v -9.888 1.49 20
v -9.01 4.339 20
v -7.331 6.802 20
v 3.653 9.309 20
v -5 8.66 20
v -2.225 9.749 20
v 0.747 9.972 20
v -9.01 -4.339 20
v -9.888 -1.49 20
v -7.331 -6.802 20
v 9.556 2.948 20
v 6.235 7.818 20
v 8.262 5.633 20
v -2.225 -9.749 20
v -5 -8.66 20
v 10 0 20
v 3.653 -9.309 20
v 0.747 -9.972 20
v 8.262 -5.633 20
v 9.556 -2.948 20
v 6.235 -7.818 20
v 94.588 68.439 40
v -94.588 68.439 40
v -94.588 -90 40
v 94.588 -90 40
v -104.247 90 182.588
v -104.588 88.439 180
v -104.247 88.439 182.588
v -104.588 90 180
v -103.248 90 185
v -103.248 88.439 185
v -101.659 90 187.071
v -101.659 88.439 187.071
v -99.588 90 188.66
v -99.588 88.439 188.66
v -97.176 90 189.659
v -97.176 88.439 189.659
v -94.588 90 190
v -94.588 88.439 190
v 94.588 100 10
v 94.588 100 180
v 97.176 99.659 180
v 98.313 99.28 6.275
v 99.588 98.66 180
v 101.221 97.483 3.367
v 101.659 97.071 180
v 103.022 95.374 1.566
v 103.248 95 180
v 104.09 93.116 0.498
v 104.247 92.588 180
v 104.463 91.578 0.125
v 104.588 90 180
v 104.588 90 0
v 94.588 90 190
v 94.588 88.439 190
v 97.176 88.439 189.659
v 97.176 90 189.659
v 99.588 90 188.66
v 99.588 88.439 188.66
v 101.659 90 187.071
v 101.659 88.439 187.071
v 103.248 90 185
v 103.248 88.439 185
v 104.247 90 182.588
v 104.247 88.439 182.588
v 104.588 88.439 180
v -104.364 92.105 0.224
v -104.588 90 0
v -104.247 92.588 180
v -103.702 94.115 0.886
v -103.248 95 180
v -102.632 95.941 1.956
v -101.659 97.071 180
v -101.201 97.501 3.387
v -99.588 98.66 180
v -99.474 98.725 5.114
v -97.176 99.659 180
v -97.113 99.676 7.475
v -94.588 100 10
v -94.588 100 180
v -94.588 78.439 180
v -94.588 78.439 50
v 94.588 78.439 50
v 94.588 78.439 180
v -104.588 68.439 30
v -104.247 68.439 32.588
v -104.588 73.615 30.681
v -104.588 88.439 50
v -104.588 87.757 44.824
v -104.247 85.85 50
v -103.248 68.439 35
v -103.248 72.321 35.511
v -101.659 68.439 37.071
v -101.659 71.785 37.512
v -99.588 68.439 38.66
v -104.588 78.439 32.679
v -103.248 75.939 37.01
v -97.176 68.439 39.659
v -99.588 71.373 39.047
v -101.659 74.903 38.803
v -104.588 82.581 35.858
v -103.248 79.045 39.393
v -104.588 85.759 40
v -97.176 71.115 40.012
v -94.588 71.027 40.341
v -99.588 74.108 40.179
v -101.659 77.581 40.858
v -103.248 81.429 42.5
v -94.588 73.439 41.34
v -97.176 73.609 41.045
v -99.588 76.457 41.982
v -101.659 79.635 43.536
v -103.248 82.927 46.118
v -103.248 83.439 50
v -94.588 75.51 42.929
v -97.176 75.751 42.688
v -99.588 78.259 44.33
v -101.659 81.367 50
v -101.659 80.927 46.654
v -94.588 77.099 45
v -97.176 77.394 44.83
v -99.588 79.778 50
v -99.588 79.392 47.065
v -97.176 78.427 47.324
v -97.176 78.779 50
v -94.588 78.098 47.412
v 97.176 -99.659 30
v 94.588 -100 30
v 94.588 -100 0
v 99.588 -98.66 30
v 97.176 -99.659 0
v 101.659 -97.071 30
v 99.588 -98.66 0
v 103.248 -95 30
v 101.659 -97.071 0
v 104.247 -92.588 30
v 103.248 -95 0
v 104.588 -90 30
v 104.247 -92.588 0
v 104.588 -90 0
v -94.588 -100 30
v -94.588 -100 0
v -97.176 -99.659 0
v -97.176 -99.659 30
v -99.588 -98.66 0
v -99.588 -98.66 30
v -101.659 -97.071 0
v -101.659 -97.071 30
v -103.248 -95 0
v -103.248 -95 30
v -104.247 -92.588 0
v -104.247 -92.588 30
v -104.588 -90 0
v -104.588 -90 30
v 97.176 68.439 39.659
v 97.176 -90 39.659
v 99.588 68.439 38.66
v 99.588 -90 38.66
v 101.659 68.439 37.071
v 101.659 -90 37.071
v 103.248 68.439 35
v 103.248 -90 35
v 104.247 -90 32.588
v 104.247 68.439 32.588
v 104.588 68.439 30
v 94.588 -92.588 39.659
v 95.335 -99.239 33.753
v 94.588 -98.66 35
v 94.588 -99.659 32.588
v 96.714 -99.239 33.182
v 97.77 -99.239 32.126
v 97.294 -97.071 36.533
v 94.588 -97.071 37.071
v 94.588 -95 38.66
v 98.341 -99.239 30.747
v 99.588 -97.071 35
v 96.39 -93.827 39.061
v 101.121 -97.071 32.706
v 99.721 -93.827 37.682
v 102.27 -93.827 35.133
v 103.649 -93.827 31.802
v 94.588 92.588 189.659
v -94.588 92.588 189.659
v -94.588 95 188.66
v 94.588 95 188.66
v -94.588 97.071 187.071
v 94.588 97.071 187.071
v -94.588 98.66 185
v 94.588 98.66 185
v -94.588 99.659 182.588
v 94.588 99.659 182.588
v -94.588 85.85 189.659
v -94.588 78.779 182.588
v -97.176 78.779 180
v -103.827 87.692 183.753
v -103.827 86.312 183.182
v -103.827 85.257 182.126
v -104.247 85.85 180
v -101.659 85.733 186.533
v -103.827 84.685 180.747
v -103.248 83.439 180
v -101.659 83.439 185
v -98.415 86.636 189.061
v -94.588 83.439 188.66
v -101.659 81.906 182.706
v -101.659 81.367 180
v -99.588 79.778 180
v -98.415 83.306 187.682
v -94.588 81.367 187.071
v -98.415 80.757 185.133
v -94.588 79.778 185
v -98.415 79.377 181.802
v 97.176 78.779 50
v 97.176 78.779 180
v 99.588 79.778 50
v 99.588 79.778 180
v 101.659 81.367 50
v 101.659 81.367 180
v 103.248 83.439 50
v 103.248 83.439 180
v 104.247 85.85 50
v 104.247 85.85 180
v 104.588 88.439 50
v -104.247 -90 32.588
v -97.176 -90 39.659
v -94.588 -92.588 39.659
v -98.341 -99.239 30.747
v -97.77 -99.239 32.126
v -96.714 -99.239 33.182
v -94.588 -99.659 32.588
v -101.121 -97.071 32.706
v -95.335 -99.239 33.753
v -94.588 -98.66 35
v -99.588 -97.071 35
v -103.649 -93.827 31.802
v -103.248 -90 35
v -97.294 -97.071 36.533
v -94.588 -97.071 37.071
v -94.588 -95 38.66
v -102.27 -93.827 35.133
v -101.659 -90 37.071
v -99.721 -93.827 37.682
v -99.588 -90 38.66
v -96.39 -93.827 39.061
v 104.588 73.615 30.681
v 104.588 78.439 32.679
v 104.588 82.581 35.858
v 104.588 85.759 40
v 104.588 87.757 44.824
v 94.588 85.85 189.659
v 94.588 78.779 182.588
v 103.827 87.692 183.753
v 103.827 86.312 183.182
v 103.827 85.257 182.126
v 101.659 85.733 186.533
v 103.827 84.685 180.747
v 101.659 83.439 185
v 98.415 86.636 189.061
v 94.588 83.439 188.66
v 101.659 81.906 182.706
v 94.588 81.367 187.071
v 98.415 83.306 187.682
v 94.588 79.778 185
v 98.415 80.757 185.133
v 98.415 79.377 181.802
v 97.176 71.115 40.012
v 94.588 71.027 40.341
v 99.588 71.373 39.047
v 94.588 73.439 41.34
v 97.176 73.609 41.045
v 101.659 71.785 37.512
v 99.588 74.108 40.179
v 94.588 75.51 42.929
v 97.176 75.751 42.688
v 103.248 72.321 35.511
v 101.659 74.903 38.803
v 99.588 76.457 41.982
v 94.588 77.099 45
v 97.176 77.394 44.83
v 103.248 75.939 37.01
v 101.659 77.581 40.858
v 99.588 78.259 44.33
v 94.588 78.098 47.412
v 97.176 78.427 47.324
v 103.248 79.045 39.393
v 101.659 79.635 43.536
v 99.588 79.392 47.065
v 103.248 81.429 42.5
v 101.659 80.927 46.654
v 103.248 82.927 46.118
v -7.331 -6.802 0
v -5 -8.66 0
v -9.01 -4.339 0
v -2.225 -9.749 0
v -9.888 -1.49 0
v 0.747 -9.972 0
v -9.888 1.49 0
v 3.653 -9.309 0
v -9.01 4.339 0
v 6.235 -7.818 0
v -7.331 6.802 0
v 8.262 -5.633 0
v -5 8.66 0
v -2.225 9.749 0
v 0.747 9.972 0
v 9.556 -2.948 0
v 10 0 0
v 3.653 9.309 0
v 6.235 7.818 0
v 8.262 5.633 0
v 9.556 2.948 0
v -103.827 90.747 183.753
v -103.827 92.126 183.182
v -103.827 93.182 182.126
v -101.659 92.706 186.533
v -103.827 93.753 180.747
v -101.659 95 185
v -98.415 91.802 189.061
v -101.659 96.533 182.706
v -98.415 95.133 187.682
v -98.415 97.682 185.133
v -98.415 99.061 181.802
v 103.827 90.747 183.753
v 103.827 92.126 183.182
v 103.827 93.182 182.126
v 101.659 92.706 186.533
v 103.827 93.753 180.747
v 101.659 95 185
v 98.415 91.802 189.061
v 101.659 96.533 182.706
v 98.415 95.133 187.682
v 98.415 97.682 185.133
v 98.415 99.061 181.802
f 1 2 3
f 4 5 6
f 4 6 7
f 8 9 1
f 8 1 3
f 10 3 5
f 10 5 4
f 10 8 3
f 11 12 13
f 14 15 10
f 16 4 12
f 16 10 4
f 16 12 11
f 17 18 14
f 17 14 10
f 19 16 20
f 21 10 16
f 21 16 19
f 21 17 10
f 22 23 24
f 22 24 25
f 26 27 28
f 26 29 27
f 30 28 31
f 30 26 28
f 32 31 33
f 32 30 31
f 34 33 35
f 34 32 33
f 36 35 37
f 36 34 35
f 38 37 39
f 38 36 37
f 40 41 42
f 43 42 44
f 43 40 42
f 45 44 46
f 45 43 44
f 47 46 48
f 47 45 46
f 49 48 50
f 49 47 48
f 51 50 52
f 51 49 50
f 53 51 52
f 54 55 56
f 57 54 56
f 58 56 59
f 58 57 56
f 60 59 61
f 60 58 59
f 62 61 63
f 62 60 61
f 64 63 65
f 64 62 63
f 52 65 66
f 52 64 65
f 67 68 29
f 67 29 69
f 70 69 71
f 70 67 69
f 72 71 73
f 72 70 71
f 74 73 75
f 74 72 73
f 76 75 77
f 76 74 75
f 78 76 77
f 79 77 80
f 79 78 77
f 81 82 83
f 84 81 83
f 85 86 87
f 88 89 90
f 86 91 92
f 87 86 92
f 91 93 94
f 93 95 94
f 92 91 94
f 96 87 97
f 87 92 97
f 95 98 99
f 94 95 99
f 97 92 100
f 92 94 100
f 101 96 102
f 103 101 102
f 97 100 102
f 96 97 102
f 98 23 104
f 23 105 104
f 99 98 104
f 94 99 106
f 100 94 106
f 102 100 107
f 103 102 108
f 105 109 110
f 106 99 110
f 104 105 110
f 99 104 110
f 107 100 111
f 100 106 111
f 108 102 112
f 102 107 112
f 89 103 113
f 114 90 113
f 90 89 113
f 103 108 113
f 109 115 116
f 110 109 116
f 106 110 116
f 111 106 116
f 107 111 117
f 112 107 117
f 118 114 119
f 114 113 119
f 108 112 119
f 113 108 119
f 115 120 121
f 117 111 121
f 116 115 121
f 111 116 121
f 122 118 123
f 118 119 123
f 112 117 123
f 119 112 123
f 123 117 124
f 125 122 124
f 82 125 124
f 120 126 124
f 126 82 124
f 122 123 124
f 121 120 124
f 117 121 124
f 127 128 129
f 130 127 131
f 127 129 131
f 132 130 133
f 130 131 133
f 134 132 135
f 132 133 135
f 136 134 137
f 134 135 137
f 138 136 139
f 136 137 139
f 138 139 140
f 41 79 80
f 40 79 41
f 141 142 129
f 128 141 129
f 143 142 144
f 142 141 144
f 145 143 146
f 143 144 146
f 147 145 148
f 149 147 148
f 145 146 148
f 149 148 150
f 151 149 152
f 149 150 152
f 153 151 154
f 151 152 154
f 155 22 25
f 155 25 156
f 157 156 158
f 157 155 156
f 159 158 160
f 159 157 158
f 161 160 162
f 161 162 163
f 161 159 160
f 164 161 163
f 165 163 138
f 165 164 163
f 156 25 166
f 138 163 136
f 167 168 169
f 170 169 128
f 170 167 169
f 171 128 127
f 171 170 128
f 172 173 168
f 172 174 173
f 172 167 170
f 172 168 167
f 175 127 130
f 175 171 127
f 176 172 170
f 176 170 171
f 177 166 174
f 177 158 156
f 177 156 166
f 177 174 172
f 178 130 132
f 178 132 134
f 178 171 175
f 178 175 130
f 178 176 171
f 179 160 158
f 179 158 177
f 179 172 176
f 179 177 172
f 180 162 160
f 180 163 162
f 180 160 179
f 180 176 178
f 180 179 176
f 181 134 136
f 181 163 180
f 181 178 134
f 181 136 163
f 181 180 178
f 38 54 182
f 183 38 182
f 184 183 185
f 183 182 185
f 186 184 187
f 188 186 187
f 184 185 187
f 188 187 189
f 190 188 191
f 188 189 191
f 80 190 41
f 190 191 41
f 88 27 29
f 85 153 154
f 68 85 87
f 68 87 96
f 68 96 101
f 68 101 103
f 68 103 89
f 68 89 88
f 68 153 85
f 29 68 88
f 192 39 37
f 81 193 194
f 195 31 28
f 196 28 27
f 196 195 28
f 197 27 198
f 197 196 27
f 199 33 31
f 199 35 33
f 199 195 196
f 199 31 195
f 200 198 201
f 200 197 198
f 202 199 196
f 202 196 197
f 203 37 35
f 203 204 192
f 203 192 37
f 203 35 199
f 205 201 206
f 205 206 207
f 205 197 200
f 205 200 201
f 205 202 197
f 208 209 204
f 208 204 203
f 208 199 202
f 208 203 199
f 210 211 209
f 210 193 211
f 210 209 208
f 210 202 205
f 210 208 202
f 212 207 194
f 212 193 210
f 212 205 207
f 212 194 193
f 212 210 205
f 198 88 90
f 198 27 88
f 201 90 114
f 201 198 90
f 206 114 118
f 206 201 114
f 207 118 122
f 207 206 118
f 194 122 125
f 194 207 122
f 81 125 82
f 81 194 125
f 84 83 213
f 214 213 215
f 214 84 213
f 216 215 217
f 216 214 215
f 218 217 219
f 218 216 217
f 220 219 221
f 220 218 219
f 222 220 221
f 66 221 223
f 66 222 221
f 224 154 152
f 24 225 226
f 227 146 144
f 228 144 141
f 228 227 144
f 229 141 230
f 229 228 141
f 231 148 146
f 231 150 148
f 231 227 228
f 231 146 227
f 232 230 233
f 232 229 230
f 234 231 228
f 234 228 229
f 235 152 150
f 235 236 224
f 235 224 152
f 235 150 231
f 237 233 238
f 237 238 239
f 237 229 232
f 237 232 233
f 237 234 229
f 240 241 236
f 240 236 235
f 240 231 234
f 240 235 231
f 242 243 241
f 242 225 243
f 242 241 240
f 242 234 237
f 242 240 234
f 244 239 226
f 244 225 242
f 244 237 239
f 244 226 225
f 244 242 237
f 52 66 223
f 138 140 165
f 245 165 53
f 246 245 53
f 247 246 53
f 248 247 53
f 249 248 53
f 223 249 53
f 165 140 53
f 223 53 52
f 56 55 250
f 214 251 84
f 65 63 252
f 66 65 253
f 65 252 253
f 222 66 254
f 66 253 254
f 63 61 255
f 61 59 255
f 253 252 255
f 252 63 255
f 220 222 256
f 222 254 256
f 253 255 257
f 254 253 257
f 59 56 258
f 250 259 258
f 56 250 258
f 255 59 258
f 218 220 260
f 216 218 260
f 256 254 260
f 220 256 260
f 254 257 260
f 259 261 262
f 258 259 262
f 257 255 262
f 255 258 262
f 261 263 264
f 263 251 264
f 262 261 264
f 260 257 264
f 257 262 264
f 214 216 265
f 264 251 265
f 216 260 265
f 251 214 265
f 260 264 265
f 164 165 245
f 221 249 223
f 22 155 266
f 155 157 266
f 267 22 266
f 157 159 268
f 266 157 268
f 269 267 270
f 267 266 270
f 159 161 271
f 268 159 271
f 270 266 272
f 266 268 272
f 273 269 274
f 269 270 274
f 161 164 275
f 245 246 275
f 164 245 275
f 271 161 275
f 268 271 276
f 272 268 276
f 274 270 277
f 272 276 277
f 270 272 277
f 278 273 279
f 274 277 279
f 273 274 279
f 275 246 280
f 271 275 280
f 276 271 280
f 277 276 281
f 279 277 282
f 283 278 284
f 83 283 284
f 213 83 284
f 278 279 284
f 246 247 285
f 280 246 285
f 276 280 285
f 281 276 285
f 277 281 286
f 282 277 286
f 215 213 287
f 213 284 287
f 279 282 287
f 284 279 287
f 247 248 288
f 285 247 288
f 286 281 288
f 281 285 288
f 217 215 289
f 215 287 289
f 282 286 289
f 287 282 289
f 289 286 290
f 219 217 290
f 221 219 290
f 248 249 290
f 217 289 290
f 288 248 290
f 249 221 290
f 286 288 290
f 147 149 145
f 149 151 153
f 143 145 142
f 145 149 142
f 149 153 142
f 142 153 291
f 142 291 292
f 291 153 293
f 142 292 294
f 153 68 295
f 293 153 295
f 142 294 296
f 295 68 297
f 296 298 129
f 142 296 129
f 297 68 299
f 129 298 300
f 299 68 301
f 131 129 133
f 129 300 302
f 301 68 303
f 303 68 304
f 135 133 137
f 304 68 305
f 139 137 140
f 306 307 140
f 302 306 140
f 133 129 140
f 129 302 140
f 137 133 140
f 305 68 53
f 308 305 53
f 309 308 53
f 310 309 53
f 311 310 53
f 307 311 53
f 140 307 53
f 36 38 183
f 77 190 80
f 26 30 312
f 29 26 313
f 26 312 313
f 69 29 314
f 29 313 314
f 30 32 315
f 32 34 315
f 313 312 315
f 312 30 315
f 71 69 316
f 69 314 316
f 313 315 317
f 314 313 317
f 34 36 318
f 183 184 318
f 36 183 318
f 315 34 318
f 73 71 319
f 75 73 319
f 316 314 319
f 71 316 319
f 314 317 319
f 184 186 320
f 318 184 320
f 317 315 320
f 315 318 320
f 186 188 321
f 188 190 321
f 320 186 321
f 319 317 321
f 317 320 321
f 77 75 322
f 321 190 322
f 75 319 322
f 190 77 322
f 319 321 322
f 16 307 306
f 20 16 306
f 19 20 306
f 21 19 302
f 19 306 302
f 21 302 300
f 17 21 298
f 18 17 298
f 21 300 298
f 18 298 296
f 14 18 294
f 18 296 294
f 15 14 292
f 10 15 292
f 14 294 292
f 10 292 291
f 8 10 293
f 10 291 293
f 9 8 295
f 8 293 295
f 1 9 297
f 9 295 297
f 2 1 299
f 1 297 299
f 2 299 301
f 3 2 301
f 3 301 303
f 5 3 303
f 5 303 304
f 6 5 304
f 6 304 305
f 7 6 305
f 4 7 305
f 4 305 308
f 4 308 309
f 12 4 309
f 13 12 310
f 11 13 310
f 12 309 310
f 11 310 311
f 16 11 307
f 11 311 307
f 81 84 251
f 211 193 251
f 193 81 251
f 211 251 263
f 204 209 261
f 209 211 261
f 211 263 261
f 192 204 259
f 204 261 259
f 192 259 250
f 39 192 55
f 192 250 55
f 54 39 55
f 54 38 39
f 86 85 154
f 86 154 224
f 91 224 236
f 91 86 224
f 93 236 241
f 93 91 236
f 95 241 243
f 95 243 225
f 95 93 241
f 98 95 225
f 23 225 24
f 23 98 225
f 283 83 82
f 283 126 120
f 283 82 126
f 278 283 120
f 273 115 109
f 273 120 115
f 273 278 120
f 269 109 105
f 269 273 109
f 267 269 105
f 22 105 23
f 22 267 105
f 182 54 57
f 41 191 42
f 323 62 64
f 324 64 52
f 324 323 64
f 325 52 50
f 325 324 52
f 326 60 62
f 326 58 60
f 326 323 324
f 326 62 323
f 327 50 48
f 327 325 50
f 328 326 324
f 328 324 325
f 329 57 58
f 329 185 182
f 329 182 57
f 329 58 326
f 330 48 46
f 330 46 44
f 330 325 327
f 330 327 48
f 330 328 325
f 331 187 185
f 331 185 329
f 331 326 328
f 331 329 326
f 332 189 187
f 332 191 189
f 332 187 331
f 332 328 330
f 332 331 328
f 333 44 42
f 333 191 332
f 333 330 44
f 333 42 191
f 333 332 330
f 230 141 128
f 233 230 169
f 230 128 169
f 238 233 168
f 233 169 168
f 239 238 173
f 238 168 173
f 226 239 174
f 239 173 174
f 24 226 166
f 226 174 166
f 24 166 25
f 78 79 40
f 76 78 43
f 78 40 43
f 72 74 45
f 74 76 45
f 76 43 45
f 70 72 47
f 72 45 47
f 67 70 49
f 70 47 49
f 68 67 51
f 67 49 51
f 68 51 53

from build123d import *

# Parameters (mm, degrees)
F0_W     = 209.176
F0_H     = 200
F1_DEPTH = 40
F2_W     = 209.176
F2_H     = 21.5614646673
F3_DEPTH = 150
F4_R     = 10
F5_DEPTH = 20
F6_F1_R  = 10
F6_F2_R  = 10
F7_R     = 10


with BuildPart() as f1:
    # F0 (on Top) → F1 (new body)
    with BuildSketch(Plane.XY):
        Rectangle(F0_W, F0_H)
    extrude(amount=F1_DEPTH)

    # F2 (on face) → F3 (join)
    with BuildSketch(Plane.XY.offset(40)):
        with Locations((0, 89.2192676663)):
            Rectangle(F2_W, F2_H)
    extrude(amount=F3_DEPTH)

    # F4 (on face) → F5 (cut)
    with BuildSketch(Plane(origin=(0, 0, 0), x_dir=(1, 0, 0), z_dir=(0, 0, -1))):
        Circle(F4_R)
    extrude(amount=-F5_DEPTH, mode=Mode.SUBTRACT)

    # F6: fillet of radius 10 on 10 edges, made by hand

    # F6_f1
    f6_f1_edges = [f1.edges().sort_by_distance(p)[0] for p in [
        (0, 78.4385353327, 40),
    ]]
    fillet(f6_f1_edges, radius=F6_F1_R)

    # F6_f2
    f6_f2_edges = [f1.edges().sort_by_distance(p)[0] for p in [
        (0, 78.4385353327, 190),
        (0, 100, 190),
        (-104.588, 89.2192676663, 190),
        (104.588, 89.2192676663, 190),
        (-104.588, 78.4385353327, 120),
        (104.588, 78.4385353327, 120),
        (104.588, 100, 95),
        (-104.588, 100, 95),
        (0, 100, 0),
        (104.588, 75.5096031445, 42.9289321881),
        (-104.588, 75.5096031445, 42.9289321881),
    ]]
    fillet(f6_f2_edges, radius=F6_F2_R)

    # F7
    f7_edges = [f1.edges().sort_by_distance(p)[0] for p in [
        (0, -100, 40),
    ]]
    fillet(f7_edges, radius=F7_R)


solid = f1.part
